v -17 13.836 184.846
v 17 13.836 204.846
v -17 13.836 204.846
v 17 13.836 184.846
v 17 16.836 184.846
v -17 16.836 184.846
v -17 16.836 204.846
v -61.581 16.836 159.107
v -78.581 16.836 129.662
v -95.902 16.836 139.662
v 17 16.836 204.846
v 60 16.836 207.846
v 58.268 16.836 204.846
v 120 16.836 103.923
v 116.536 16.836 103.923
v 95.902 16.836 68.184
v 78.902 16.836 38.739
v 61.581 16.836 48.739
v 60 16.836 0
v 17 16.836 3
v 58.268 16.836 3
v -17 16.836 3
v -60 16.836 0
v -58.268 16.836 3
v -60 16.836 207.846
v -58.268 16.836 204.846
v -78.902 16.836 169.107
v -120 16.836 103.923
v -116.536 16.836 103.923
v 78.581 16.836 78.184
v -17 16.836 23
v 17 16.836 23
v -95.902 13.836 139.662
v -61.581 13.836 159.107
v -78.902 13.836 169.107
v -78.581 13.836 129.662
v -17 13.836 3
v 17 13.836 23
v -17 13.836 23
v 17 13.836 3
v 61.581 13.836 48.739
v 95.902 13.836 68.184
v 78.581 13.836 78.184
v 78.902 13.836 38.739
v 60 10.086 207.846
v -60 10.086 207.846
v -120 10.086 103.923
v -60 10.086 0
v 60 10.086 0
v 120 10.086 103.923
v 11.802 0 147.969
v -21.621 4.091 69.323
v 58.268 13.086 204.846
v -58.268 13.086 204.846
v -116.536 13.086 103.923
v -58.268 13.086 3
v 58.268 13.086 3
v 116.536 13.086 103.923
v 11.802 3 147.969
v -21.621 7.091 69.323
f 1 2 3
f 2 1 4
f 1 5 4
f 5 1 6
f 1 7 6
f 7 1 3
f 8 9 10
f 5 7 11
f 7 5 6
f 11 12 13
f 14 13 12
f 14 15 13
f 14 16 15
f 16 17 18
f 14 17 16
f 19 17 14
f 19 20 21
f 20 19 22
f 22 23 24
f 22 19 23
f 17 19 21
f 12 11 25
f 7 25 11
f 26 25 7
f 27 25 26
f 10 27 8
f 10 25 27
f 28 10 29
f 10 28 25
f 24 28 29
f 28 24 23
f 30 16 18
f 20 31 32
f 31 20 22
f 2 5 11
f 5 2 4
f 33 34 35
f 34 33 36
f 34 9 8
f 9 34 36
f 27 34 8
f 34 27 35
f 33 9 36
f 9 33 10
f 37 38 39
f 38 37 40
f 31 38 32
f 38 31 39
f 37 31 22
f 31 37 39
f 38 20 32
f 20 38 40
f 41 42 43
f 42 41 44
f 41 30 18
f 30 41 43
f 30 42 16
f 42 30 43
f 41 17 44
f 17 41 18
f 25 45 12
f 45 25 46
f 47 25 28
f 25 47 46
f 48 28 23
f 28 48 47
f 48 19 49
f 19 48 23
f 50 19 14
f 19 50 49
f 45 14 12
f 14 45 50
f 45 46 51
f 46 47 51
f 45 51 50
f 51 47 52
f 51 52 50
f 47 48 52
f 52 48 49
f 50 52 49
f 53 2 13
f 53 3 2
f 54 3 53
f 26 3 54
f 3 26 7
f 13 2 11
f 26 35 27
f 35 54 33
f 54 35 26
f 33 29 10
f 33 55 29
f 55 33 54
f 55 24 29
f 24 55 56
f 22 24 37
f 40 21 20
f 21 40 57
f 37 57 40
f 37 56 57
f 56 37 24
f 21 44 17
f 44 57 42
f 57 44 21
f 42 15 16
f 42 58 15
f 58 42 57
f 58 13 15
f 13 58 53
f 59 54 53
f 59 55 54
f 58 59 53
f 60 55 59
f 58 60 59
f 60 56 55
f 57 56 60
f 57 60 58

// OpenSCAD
/*
    parametric_faceted_hex_wall_tile_mount_v34_clean_original_sticky_tabs.scad
    ------------------------------------------------------------
    Improved asymmetric low-poly hex wall tile.

    Major v22 changes
    -----------------
    1. ONE master thickness control drives the whole part:
       master_thickness_mm

    2. FIXED mounting tabs showing through the front face.
       - edge height now automatically provides enough cavity depth
         for the full mounting-pad thickness
       - mounting tabs and ribs are also clipped against a safe volume
         below the underside of the faceted front shell
       - tabs therefore remain hidden inside the tile


       It controls:
       - faceted front shell thickness
       - perimeter wall thickness
       - mounting-tab thickness

       Optional multipliers allow advanced tuning without hiding the
       master control.

    2. Thicker shells now work automatically.
       The effective edge height is automatically raised when required
       so shell_thickness_mm is never blocked by a too-small edge height.

    3. Mounting pads cannot protrude outside the hexagon.
       Pads are intersected with a smaller inset hex footprint.

    4. Stronger default mounting geometry.
       - 3.0 mm pad thickness
       - 4.0 mm shell overlap
       - 3.0 mm edge inset
       - optional reinforcing ribs

    5. Open back remains truly open.
       There is no rear floor across the middle.

    Recommended use
    ---------------
    For a 9-inch decorative wall tile printed vertically:

        master_thickness_mm        = 3.0;
        front_shell_multiplier      = 1.0;
        perimeter_multiplier        = 1.0;
        mount_pad_multiplier        = 1.0;
        mount_pad_overlap_mm        = 4.0;
        mount_pad_edge_inset_mm     = 3.0;
        add_mount_ribs              = true;

    Export
    ------
    F6 Render
    File -> Export -> Export as STL
*/


// =============================================================================
// CUSTOMIZER PARAMETERS
// =============================================================================


/* [Tile Size] */

// Which dimension tile_size represents.
size_reference = "across_corners";   // [flat_to_flat, across_corners]

// Units for tile_size.
size_units = "mm";                   // [mm, in]

// Examples:
// 152.4 = 6"
// 203.2 = 8"
// 228.6 = 9"
// 254.0 = 10"
tile_size = 240.0;

// Rotate finished tile around Z.
tile_rotation_deg = 15;


/* [Export / Print Orientation] */

// "flat"     = original CAD orientation.
// "vertical" = stand the tile on one complete flat hex side.
export_orientation = "vertical";          // [flat, vertical]

// Finished face uses 15 degrees. Adding another 15 degrees before standing
// gives an effective 30-degree regular-hex orientation, so a COMPLETE FLAT
// SIDE rests on the build plate.
vertical_edge_angle_deg = 15;



/* [MASTER THICKNESS] */

// MASTER MATERIAL THICKNESS.
//
// THIS is the main control to use if you want the whole printed part
// physically thicker / stronger.
//
// It directly drives:
//   - faceted front shell thickness
//   - perimeter wall thickness
//   - mounting pad thickness
//
// Recommended:
//   1.6 = light
//   2.0 = medium
//   2.5 = strong
//   3.0 = very strong / recommended for a robust wall tile
//   3.5 = heavy duty
//
master_thickness_mm = 3.0;

// Optional multipliers.
//
// Leave these at 1.0 unless you deliberately want one area stronger
// than the master value.
//
// Example:
// perimeter_multiplier = 1.20 makes a 3.0 mm master produce a
// 3.6 mm perimeter.
front_shell_multiplier = 1.0;
perimeter_multiplier   = 1.0;
mount_pad_multiplier   = 1.0;

// Derived thicknesses are calculated later from the master control.


/* [Front Relief] */

// proportional = scales with tile size
// absolute     = exact millimeter heights below
relief_height_mode = "proportional";    // [proportional, absolute]

// Overall relief multiplier.
relief_scale = 1.0;

// Main peak height relative to flat-to-flat size.
peak_height_ratio = 0.081;

// Ridge height relative to peak.
ridge_to_peak_ratio = 0.757;

// Requested outer edge height relative to peak.
//
// IMPORTANT:
// v21 automatically raises edge height if necessary to fit the selected
// front shell thickness. You normally do NOT need to change this anymore.
edge_to_peak_ratio = 0.097;

// Absolute values, used only in absolute mode.
peak_height_mm  = 18.5;
ridge_height_mm = 14.0;
edge_height_mm  = 1.8;

// Minimum empty clearance between the inner roof and Z=0 at the perimeter.
//
// v20 uses:
// effective_edge_height >= front_shell_thickness_mm + edge_clearance_mm
edge_clearance_mm = 0.60;


/* [Facet Layout] */

// Direction of main peak, CCW from +X.
peak_angle_deg = 45;

// Peak distance from center as a fraction of circumradius.
peak_radius_ratio = 0.38;

// Direction of secondary ridge.
ridge_angle_deg = 208;

// Ridge radial position.
ridge_radius_ratio = 0.34;


/* [Wall Mounting] */

// Enable mounting pads.
add_mount_pads = true;

// Width of each pad parallel to the corresponding hex side.
mount_pad_width_mm = 34.0;

// Radial depth of each pad.
mount_pad_depth_mm = 24.0;

// Mounting-tab thickness is now driven by master_thickness_mm.
// Use mount_pad_multiplier above only if the tabs need to be thicker
// or thinner than the rest of the tile.

// How far the pad reaches beneath the inner perimeter shell.
//
// More overlap creates a stronger pad-to-rim union.
mount_pad_overlap_mm = 4.0;

// Pull the ENTIRE usable pad footprint inward from the outside hex edge.
//
// Pads are clipped against this inset hex, so they cannot protrude outside.
mount_pad_edge_inset_mm = 2.0;

// Minimum air gap between the TOP of mounting geometry and the
// UNDERSIDE of the faceted front shell.
//
// This prevents tabs/ribs from becoming visible through the face.
// Recommended: 0.50-1.00 mm.
mount_face_clearance_mm = 0.75;

// Directions of mounting pads.
mount_pad_angles = [60, 120, 240, 300];


/* [Mount Reinforcement] */

// Add small triangular reinforcing ribs where pads meet the perimeter.
//
// Recommended ON for vertical printing.
add_mount_ribs = false;

// Rib thickness across the pad.
mount_rib_width_mm = 3.0;

// Rib height into the cavity.
mount_rib_height_mm = 5.0;

// Rib radial depth.
mount_rib_depth_mm = 8.0;


/* [Optional Screw Holes] */

add_pad_screw_holes = false;

// 3.5 ~= #6
// 4.5 ~= #8
pad_screw_hole_diameter_mm = 4.5;


/* [Advanced] */

// Polyhedron preview hint.
polyhedron_convexity = 12;

// Cylinder quality for screw holes.
screw_hole_fn = 40;


// =============================================================================
// DERIVED MATERIAL THICKNESSES
// =============================================================================
//
// These are the ACTUAL thicknesses used by the model.
//

front_shell_thickness_mm =
    master_thickness_mm * front_shell_multiplier;

perimeter_wall_thickness_mm =
    master_thickness_mm * perimeter_multiplier;

mount_pad_thickness_mm =
    master_thickness_mm * mount_pad_multiplier;


// =============================================================================
// DERIVED TILE DIMENSIONS
// =============================================================================

_tile_size_mm =
    size_units == "in"
        ? tile_size * 25.4
        : tile_size;

tile_flat_to_flat =
    size_reference == "flat_to_flat"
        ? _tile_size_mm
        : _tile_size_mm * cos(30);

tile_across_corners =
    tile_flat_to_flat / cos(30);

outer_apothem =
    tile_flat_to_flat / 2;

r_outer =
    outer_apothem / cos(30);

inner_apothem =
    outer_apothem - perimeter_wall_thickness_mm;

r_inner =
    inner_apothem / cos(30);

inner_flat_length =
    2 * inner_apothem * tan(30);

hex_side_length =
    2 * r_outer * sin(30);


// =============================================================================
// DERIVED VERTICAL-PRINT GEOMETRY
// =============================================================================

vertical_total_rotation_deg =
    tile_rotation_deg + vertical_edge_angle_deg;

vertical_half_y =
    max([
        for (i = [0 : 5])
            abs(
                r_outer
                * sin(
                    30
                    + i * 60
                    + vertical_total_rotation_deg
                )
            )
    ]);

vertical_print_height =
    2 * vertical_half_y;


// =============================================================================
// DERIVED RELIEF HEIGHTS
// =============================================================================

_peak_unscaled =
    relief_height_mode == "proportional"
        ? tile_flat_to_flat * peak_height_ratio
        : peak_height_mm;

_ridge_unscaled =
    relief_height_mode == "proportional"
        ? _peak_unscaled * ridge_to_peak_ratio
        : ridge_height_mm;

_requested_edge_unscaled =
    relief_height_mode == "proportional"
        ? _peak_unscaled * edge_to_peak_ratio
        : edge_height_mm;

peak_height =
    _peak_unscaled * relief_scale;

ridge_height =
    _ridge_unscaled * relief_scale;

requested_edge_height =
    _requested_edge_unscaled * relief_scale;

// AUTO-FIX:
// Guarantee enough vertical room for BOTH:
//   1. the chosen front-shell thickness
//   2. the full mounting-pad thickness
//
// This is the key v22 fix for tabs previously breaking through the face.
minimum_edge_height =
    front_shell_thickness_mm
    + mount_pad_thickness_mm
    + mount_face_clearance_mm;

edge_height =
    max(
        requested_edge_height,
        minimum_edge_height
    );


// =============================================================================
// DERIVED MOUNTING GEOMETRY
// =============================================================================

// Desired outer edge before clipping.
//
// This allows the pad to overlap the inner wall structurally.
mount_pad_desired_outer_r =
    inner_apothem + mount_pad_overlap_mm;

mount_pad_inner_r =
    mount_pad_desired_outer_r - mount_pad_depth_mm;

mount_pad_center_r =
    mount_pad_desired_outer_r - mount_pad_depth_mm / 2;

// Smaller hex used as a hard clipping boundary.
//
// Any mount geometry outside this boundary is removed automatically.
mount_clip_apothem =
    outer_apothem - mount_pad_edge_inset_mm;

mount_clip_radius =
    mount_clip_apothem / cos(30);


// =============================================================================
// VALIDATION
// =============================================================================

assert(
    tile_flat_to_flat > 0,
    "tile_size must produce a positive tile dimension."
);

assert(
    master_thickness_mm > 0,
    "master_thickness_mm must be greater than zero."
);

assert(
    front_shell_multiplier > 0 &&
    perimeter_multiplier > 0 &&
    mount_pad_multiplier > 0,
    "All thickness multipliers must be greater than zero."
);

assert(
    front_shell_thickness_mm > 0,
    "front_shell_thickness_mm must be greater than zero."
);

assert(
    perimeter_wall_thickness_mm > 0,
    "perimeter_wall_thickness_mm must be greater than zero."
);

assert(
    perimeter_wall_thickness_mm < outer_apothem,
    "perimeter_wall_thickness_mm is too large for this tile."
);

assert(
    inner_apothem > 0,
    "The selected perimeter wall leaves no hollow interior."
);

assert(
    edge_height > front_shell_thickness_mm,
    "Internal error: edge_height must exceed front_shell_thickness_mm."
);

assert(
    ridge_height > edge_height,
    "ridge_height must remain greater than the effective edge height."
);

assert(
    peak_height > ridge_height,
    "peak_height must remain greater than ridge_height."
);

assert(
    peak_radius_ratio > 0 && peak_radius_ratio < 0.90,
    "peak_radius_ratio must be between 0 and 0.90."
);

assert(
    ridge_radius_ratio > 0 && ridge_radius_ratio < 0.90,
    "ridge_radius_ratio must be between 0 and 0.90."
);

assert(
    mount_pad_width_mm > 0,
    "mount_pad_width_mm must be greater than zero."
);

assert(
    mount_pad_depth_mm > 0,
    "mount_pad_depth_mm must be greater than zero."
);

assert(
    mount_pad_thickness_mm > 0,
    "mount_pad_thickness_mm must be greater than zero."
);

assert(
    mount_pad_overlap_mm >= 0,
    "mount_pad_overlap_mm cannot be negative."
);

assert(
    mount_pad_edge_inset_mm >= 0,
    "mount_pad_edge_inset_mm cannot be negative."
);

assert(
    mount_face_clearance_mm >= 0,
    "mount_face_clearance_mm cannot be negative."
);

assert(
    mount_clip_apothem > 0,
    "mount_pad_edge_inset_mm is too large."
);

assert(
    mount_pad_inner_r > 0,
    "mount_pad_depth_mm is too large and reaches/passes the tile center."
);

assert(
    !add_pad_screw_holes ||
    pad_screw_hole_diameter_mm < mount_pad_width_mm * 0.75,
    "pad_screw_hole_diameter_mm is too large for the mounting pad."
);

assert(
    !add_mount_ribs ||
    mount_rib_height_mm > 0,
    "mount_rib_height_mm must be greater than zero."
);


// =============================================================================
// DIAGNOSTIC OUTPUT
// =============================================================================

echo("====================================================");
echo("FACETED HEX WALL TILE v22");
echo("====================================================");

echo(str("flat-to-flat             : ", tile_flat_to_flat, " mm"));
echo(str("across-corners           : ", tile_across_corners, " mm"));
echo(str("hex side length          : ", hex_side_length, " mm"));

echo(str("MASTER thickness         : ", master_thickness_mm, " mm"));
echo(str("actual front shell       : ", front_shell_thickness_mm, " mm"));
echo(str("actual perimeter wall    : ", perimeter_wall_thickness_mm, " mm"));
echo(str("actual mount pad         : ", mount_pad_thickness_mm, " mm"));
echo(str("perimeter wall thickness : ", perimeter_wall_thickness_mm, " mm"));

echo(str("requested edge height    : ", requested_edge_height, " mm"));
echo(str("minimum edge height      : ", minimum_edge_height, " mm"));
echo(str("EFFECTIVE edge height    : ", edge_height, " mm"));

echo(str("ridge height             : ", ridge_height, " mm"));
echo(str("peak height              : ", peak_height, " mm"));
echo(str("export orientation       : ", export_orientation));
echo(str("vertical print height    : ", vertical_print_height, " mm"));
echo(str("vertical relief depth    : ", peak_height, " mm"));
echo(str("effective print rotation : ", vertical_total_rotation_deg, " deg"));

echo(str("mount pad width          : ", mount_pad_width_mm, " mm"));
echo(str("mount pad depth          : ", mount_pad_depth_mm, " mm"));
echo(str("mount pad thickness      : ", mount_pad_thickness_mm, " mm"));
echo(str("mount pad overlap        : ", mount_pad_overlap_mm, " mm"));
echo(str("mount edge inset         : ", mount_pad_edge_inset_mm, " mm"));
echo(str("mount/face clearance     : ", mount_face_clearance_mm, " mm"));

echo(str("mount clip apothem       : ", mount_clip_apothem, " mm"));

if (edge_height > requested_edge_height)
    echo(
        str(
            "AUTO EDGE FIX ACTIVE: edge raised from ",
            requested_edge_height,
            " mm to ",
            edge_height,
            " mm so a ",
            front_shell_thickness_mm,
            " mm front shell and ", mount_pad_thickness_mm, " mm mounting tabs fit safely."
        )
    );

echo("====================================================");


// =============================================================================
// HELPERS
// =============================================================================

function polar(angle_deg, radius) =
    [
        radius * cos(angle_deg),
        radius * sin(angle_deg)
    ];

function hex_vertex(i, radius) =
    [
        radius * cos(30 + i * 60),
        radius * sin(30 + i * 60)
    ];


// =============================================================================
// FRONT RELIEF CONTROL POINTS
// =============================================================================

P_xy =
    polar(
        peak_angle_deg,
        r_outer * peak_radius_ratio
    );

Q_xy =
    polar(
        ridge_angle_deg,
        r_outer * ridge_radius_ratio
    );


// =============================================================================
// SHELL VERTICES
// =============================================================================

points =
    concat(

        // 0..5 : outer rear perimeter
        [
            for (i = [0 : 5])
                let(p = hex_vertex(i, r_outer))
                [p[0], p[1], 0]
        ],

        // 6..11 : outer front perimeter
        [
            for (i = [0 : 5])
                let(p = hex_vertex(i, r_outer))
                [p[0], p[1], edge_height]
        ],

        // 12..13 : outer peak / ridge
        [
            [P_xy[0], P_xy[1], peak_height],
            [Q_xy[0], Q_xy[1], ridge_height]
        ],

        // 14..19 : inner rear perimeter
        [
            for (i = [0 : 5])
                let(p = hex_vertex(i, r_inner))
                [p[0], p[1], 0]
        ],

        // 20..25 : inner front perimeter
        [
            for (i = [0 : 5])
                let(p = hex_vertex(i, r_inner))
                [p[0], p[1], edge_height - front_shell_thickness_mm]
        ],

        // 26..27 : inner peak / ridge
        [
            [P_xy[0], P_xy[1], peak_height - front_shell_thickness_mm],
            [Q_xy[0], Q_xy[1], ridge_height - front_shell_thickness_mm]
        ]
    );


// =============================================================================
// SHELL FACES
// =============================================================================

outer_roof_faces = [
    [6, 7, 12],
    [7, 8, 12],
    [6, 12, 11],

    [8, 13, 12],
    [11, 12, 13],

    [8, 9, 13],
    [9, 10, 13],
    [10, 11, 13]
];

inner_roof_faces = [
    [26, 21, 20],
    [26, 22, 21],
    [25, 26, 20],

    [26, 27, 22],
    [27, 26, 25],

    [27, 23, 22],
    [27, 24, 23],
    [27, 25, 24]
];

faces =
    concat(

        // Outer vertical perimeter
        [
            for (i = [0 : 5])
                [
                    i,
                    (i + 1) % 6,
                    6 + (i + 1) % 6,
                    6 + i
                ]
        ],

        outer_roof_faces,

        // Inner vertical perimeter
        [
            for (i = [0 : 5])
                [
                    14 + i,
                    20 + i,
                    20 + (i + 1) % 6,
                    14 + (i + 1) % 6
                ]
        ],

        inner_roof_faces,

        // Narrow rear perimeter ring only.
        // Center remains open.
        [
            for (i = [0 : 5])
                [
                    i,
                    14 + i,
                    14 + (i + 1) % 6,
                    (i + 1) % 6
                ]
        ]
    );


// =============================================================================
// TILE SHELL
// =============================================================================

module tile_shell() {
    polyhedron(
        points = points,
        faces = faces,
        convexity = polyhedron_convexity
    );
}


// =============================================================================
// SAFE MOUNTING VOLUME BELOW THE FRONT FACE
// =============================================================================
//
// This volume follows the UNDERSIDE of the faceted front shell, offset
// downward by mount_face_clearance_mm.
//
// Mount pads and ribs are intersected with this volume. Even if a future
// parameter combination becomes aggressive, mounting geometry cannot pass
// through the visible front shell.
//

safe_edge_z =
    max(
        0.01,
        edge_height
        - front_shell_thickness_mm
        - mount_face_clearance_mm
    );

safe_peak_z =
    max(
        0.01,
        peak_height
        - front_shell_thickness_mm
        - mount_face_clearance_mm
    );

safe_ridge_z =
    max(
        0.01,
        ridge_height
        - front_shell_thickness_mm
        - mount_face_clearance_mm
    );

safe_mount_points =
    concat(

        // 0..5: rear outer perimeter
        [
            for (i = [0 : 5])
                let(p = hex_vertex(i, r_outer))
                [p[0], p[1], 0]
        ],

        // 6..11: safe ceiling at outer perimeter
        [
            for (i = [0 : 5])
                let(p = hex_vertex(i, r_outer))
                [p[0], p[1], safe_edge_z]
        ],

        // 12..13: safe ceiling under peak/ridge
        [
            [P_xy[0], P_xy[1], safe_peak_z],
            [Q_xy[0], Q_xy[1], safe_ridge_z]
        ]
    );

safe_mount_ceiling_faces = [
    [6, 7, 12],
    [7, 8, 12],
    [6, 12, 11],
    [8, 13, 12],
    [11, 12, 13],
    [8, 9, 13],
    [9, 10, 13],
    [10, 11, 13]
];

safe_mount_faces =
    concat(

        // Outer side walls.
        [
            for (i = [0 : 5])
                [
                    i,
                    (i + 1) % 6,
                    6 + (i + 1) % 6,
                    6 + i
                ]
        ],

        // Sloped safe ceiling.
        safe_mount_ceiling_faces,

        // Rear floor used only as a clipping volume closure.
        [[5, 4, 3, 2, 1, 0]]
    );

module safe_mount_volume() {
    polyhedron(
        points = safe_mount_points,
        faces = safe_mount_faces,
        convexity = polyhedron_convexity
    );
}


// =============================================================================
// HEX FOOTPRINT USED TO CLIP MOUNTING TABS
// =============================================================================
//
// This is intentionally smaller than the visible outer hexagon.
// Therefore mount pads/ribs cannot stick out past the visible perimeter.
//

module mount_clip_volume(height_mm) {
    linear_extrude(height = height_mm)
        polygon(
            points = [
                for (i = [0 : 5])
                    hex_vertex(i, mount_clip_radius)
            ]
        );
}


// =============================================================================
// RAW MOUNT PAD
// =============================================================================

module raw_mount_pad(angle_deg) {
    rotate([0, 0, angle_deg])
        translate(
            [
                mount_pad_inner_r,
                -mount_pad_width_mm / 2,
                0
            ]
        )
            cube(
                [
                    mount_pad_depth_mm,
                    mount_pad_width_mm,
                    mount_pad_thickness_mm
                ]
            );
}


// =============================================================================
// CLIPPED MOUNT PAD
// =============================================================================

module mount_pad(angle_deg) {
    intersection() {

        raw_mount_pad(angle_deg);

        // Keep pad inside the inset hex footprint.
        mount_clip_volume(
            mount_pad_thickness_mm + 0.01
        );

        // Hard stop below the underside of the front face.
        safe_mount_volume();
    }
}


// =============================================================================
// OPTIONAL REINFORCING RIBS
// =============================================================================
//
// Two ribs are placed near the left/right sides of each mounting pad.
//
// They rise into the cavity and help resist bending at the pad-to-shell joint.
//

module raw_mount_ribs(angle_deg) {

    rib_center_r =
        mount_pad_desired_outer_r
        - mount_rib_depth_mm / 2;

    rib_side_offset =
        max(
            0,
            mount_pad_width_mm / 2
            - mount_rib_width_mm
            - 2
        );

    rotate([0, 0, angle_deg]) {

        for (side = [-1, 1]) {

            translate(
                [
                    rib_center_r - mount_rib_depth_mm / 2,
                    side * rib_side_offset - mount_rib_width_mm / 2,
                    mount_pad_thickness_mm
                ]
            )

            rotate([90, 0, 90])

            linear_extrude(height = mount_rib_depth_mm)

            polygon(
                points = [
                    [0, 0],
                    [mount_rib_width_mm, 0],
                    [mount_rib_width_mm, mount_rib_height_mm],
                    [0, 0]
                ]
            );
        }
    }
}


module mount_ribs(angle_deg) {
    intersection() {

        raw_mount_ribs(angle_deg);

        mount_clip_volume(
            mount_pad_thickness_mm
            + mount_rib_height_mm
            + 0.1
        );

        // Ribs are also prohibited from crossing the front-shell underside.
        safe_mount_volume();
    }
}


// =============================================================================
// OPTIONAL SCREW HOLE
// =============================================================================

module pad_screw_hole(angle_deg) {

    rotate([0, 0, angle_deg])

        translate(
            [
                mount_pad_center_r,
                0,
                -1
            ]
        )

            cylinder(
                d = pad_screw_hole_diameter_mm,
                h =
                    mount_pad_thickness_mm
                    + mount_rib_height_mm
                    + 2,
                $fn = screw_hole_fn
            );
}


// =============================================================================
// COMPLETE MODEL
// =============================================================================

module model() {

    rotate([0, 0, tile_rotation_deg]) {

        difference() {

            union() {

                tile_shell();

                if (add_mount_pads) {

                    for (a = mount_pad_angles) {

                        mount_pad(a);

                        if (add_mount_ribs)
                            mount_ribs(a);
                    }
                }
            }

            if (
                add_mount_pads &&
                add_pad_screw_holes
            ) {

                for (a = mount_pad_angles)
                    pad_screw_hole(a);
            }
        }
    }
}


// =============================================================================
// OUTPUT
// =============================================================================
//
// CLEAN ORIGINAL-MOUNT VERSION:
// - exact v22-style hidden rectangular sticky pads
// - no stabilizer feet
// - no sacrificial fins
// - no gussets
// - no native vertical replacement pads
// - no screw holes
// - no mount ribs
//
// The model remains a true regular hex. For vertical export, it is stood on a
// complete flat side and translated so the bottom edge sits at Z=0.

module output_model() {

    if (export_orientation == "vertical") {

        translate(
            [
                0,
                peak_height,
                vertical_half_y
            ]
        )

        rotate([90, 0, 0])

        rotate([0, 0, vertical_edge_angle_deg])

            model();

    } else {

        model();
    }
}

output_model();
